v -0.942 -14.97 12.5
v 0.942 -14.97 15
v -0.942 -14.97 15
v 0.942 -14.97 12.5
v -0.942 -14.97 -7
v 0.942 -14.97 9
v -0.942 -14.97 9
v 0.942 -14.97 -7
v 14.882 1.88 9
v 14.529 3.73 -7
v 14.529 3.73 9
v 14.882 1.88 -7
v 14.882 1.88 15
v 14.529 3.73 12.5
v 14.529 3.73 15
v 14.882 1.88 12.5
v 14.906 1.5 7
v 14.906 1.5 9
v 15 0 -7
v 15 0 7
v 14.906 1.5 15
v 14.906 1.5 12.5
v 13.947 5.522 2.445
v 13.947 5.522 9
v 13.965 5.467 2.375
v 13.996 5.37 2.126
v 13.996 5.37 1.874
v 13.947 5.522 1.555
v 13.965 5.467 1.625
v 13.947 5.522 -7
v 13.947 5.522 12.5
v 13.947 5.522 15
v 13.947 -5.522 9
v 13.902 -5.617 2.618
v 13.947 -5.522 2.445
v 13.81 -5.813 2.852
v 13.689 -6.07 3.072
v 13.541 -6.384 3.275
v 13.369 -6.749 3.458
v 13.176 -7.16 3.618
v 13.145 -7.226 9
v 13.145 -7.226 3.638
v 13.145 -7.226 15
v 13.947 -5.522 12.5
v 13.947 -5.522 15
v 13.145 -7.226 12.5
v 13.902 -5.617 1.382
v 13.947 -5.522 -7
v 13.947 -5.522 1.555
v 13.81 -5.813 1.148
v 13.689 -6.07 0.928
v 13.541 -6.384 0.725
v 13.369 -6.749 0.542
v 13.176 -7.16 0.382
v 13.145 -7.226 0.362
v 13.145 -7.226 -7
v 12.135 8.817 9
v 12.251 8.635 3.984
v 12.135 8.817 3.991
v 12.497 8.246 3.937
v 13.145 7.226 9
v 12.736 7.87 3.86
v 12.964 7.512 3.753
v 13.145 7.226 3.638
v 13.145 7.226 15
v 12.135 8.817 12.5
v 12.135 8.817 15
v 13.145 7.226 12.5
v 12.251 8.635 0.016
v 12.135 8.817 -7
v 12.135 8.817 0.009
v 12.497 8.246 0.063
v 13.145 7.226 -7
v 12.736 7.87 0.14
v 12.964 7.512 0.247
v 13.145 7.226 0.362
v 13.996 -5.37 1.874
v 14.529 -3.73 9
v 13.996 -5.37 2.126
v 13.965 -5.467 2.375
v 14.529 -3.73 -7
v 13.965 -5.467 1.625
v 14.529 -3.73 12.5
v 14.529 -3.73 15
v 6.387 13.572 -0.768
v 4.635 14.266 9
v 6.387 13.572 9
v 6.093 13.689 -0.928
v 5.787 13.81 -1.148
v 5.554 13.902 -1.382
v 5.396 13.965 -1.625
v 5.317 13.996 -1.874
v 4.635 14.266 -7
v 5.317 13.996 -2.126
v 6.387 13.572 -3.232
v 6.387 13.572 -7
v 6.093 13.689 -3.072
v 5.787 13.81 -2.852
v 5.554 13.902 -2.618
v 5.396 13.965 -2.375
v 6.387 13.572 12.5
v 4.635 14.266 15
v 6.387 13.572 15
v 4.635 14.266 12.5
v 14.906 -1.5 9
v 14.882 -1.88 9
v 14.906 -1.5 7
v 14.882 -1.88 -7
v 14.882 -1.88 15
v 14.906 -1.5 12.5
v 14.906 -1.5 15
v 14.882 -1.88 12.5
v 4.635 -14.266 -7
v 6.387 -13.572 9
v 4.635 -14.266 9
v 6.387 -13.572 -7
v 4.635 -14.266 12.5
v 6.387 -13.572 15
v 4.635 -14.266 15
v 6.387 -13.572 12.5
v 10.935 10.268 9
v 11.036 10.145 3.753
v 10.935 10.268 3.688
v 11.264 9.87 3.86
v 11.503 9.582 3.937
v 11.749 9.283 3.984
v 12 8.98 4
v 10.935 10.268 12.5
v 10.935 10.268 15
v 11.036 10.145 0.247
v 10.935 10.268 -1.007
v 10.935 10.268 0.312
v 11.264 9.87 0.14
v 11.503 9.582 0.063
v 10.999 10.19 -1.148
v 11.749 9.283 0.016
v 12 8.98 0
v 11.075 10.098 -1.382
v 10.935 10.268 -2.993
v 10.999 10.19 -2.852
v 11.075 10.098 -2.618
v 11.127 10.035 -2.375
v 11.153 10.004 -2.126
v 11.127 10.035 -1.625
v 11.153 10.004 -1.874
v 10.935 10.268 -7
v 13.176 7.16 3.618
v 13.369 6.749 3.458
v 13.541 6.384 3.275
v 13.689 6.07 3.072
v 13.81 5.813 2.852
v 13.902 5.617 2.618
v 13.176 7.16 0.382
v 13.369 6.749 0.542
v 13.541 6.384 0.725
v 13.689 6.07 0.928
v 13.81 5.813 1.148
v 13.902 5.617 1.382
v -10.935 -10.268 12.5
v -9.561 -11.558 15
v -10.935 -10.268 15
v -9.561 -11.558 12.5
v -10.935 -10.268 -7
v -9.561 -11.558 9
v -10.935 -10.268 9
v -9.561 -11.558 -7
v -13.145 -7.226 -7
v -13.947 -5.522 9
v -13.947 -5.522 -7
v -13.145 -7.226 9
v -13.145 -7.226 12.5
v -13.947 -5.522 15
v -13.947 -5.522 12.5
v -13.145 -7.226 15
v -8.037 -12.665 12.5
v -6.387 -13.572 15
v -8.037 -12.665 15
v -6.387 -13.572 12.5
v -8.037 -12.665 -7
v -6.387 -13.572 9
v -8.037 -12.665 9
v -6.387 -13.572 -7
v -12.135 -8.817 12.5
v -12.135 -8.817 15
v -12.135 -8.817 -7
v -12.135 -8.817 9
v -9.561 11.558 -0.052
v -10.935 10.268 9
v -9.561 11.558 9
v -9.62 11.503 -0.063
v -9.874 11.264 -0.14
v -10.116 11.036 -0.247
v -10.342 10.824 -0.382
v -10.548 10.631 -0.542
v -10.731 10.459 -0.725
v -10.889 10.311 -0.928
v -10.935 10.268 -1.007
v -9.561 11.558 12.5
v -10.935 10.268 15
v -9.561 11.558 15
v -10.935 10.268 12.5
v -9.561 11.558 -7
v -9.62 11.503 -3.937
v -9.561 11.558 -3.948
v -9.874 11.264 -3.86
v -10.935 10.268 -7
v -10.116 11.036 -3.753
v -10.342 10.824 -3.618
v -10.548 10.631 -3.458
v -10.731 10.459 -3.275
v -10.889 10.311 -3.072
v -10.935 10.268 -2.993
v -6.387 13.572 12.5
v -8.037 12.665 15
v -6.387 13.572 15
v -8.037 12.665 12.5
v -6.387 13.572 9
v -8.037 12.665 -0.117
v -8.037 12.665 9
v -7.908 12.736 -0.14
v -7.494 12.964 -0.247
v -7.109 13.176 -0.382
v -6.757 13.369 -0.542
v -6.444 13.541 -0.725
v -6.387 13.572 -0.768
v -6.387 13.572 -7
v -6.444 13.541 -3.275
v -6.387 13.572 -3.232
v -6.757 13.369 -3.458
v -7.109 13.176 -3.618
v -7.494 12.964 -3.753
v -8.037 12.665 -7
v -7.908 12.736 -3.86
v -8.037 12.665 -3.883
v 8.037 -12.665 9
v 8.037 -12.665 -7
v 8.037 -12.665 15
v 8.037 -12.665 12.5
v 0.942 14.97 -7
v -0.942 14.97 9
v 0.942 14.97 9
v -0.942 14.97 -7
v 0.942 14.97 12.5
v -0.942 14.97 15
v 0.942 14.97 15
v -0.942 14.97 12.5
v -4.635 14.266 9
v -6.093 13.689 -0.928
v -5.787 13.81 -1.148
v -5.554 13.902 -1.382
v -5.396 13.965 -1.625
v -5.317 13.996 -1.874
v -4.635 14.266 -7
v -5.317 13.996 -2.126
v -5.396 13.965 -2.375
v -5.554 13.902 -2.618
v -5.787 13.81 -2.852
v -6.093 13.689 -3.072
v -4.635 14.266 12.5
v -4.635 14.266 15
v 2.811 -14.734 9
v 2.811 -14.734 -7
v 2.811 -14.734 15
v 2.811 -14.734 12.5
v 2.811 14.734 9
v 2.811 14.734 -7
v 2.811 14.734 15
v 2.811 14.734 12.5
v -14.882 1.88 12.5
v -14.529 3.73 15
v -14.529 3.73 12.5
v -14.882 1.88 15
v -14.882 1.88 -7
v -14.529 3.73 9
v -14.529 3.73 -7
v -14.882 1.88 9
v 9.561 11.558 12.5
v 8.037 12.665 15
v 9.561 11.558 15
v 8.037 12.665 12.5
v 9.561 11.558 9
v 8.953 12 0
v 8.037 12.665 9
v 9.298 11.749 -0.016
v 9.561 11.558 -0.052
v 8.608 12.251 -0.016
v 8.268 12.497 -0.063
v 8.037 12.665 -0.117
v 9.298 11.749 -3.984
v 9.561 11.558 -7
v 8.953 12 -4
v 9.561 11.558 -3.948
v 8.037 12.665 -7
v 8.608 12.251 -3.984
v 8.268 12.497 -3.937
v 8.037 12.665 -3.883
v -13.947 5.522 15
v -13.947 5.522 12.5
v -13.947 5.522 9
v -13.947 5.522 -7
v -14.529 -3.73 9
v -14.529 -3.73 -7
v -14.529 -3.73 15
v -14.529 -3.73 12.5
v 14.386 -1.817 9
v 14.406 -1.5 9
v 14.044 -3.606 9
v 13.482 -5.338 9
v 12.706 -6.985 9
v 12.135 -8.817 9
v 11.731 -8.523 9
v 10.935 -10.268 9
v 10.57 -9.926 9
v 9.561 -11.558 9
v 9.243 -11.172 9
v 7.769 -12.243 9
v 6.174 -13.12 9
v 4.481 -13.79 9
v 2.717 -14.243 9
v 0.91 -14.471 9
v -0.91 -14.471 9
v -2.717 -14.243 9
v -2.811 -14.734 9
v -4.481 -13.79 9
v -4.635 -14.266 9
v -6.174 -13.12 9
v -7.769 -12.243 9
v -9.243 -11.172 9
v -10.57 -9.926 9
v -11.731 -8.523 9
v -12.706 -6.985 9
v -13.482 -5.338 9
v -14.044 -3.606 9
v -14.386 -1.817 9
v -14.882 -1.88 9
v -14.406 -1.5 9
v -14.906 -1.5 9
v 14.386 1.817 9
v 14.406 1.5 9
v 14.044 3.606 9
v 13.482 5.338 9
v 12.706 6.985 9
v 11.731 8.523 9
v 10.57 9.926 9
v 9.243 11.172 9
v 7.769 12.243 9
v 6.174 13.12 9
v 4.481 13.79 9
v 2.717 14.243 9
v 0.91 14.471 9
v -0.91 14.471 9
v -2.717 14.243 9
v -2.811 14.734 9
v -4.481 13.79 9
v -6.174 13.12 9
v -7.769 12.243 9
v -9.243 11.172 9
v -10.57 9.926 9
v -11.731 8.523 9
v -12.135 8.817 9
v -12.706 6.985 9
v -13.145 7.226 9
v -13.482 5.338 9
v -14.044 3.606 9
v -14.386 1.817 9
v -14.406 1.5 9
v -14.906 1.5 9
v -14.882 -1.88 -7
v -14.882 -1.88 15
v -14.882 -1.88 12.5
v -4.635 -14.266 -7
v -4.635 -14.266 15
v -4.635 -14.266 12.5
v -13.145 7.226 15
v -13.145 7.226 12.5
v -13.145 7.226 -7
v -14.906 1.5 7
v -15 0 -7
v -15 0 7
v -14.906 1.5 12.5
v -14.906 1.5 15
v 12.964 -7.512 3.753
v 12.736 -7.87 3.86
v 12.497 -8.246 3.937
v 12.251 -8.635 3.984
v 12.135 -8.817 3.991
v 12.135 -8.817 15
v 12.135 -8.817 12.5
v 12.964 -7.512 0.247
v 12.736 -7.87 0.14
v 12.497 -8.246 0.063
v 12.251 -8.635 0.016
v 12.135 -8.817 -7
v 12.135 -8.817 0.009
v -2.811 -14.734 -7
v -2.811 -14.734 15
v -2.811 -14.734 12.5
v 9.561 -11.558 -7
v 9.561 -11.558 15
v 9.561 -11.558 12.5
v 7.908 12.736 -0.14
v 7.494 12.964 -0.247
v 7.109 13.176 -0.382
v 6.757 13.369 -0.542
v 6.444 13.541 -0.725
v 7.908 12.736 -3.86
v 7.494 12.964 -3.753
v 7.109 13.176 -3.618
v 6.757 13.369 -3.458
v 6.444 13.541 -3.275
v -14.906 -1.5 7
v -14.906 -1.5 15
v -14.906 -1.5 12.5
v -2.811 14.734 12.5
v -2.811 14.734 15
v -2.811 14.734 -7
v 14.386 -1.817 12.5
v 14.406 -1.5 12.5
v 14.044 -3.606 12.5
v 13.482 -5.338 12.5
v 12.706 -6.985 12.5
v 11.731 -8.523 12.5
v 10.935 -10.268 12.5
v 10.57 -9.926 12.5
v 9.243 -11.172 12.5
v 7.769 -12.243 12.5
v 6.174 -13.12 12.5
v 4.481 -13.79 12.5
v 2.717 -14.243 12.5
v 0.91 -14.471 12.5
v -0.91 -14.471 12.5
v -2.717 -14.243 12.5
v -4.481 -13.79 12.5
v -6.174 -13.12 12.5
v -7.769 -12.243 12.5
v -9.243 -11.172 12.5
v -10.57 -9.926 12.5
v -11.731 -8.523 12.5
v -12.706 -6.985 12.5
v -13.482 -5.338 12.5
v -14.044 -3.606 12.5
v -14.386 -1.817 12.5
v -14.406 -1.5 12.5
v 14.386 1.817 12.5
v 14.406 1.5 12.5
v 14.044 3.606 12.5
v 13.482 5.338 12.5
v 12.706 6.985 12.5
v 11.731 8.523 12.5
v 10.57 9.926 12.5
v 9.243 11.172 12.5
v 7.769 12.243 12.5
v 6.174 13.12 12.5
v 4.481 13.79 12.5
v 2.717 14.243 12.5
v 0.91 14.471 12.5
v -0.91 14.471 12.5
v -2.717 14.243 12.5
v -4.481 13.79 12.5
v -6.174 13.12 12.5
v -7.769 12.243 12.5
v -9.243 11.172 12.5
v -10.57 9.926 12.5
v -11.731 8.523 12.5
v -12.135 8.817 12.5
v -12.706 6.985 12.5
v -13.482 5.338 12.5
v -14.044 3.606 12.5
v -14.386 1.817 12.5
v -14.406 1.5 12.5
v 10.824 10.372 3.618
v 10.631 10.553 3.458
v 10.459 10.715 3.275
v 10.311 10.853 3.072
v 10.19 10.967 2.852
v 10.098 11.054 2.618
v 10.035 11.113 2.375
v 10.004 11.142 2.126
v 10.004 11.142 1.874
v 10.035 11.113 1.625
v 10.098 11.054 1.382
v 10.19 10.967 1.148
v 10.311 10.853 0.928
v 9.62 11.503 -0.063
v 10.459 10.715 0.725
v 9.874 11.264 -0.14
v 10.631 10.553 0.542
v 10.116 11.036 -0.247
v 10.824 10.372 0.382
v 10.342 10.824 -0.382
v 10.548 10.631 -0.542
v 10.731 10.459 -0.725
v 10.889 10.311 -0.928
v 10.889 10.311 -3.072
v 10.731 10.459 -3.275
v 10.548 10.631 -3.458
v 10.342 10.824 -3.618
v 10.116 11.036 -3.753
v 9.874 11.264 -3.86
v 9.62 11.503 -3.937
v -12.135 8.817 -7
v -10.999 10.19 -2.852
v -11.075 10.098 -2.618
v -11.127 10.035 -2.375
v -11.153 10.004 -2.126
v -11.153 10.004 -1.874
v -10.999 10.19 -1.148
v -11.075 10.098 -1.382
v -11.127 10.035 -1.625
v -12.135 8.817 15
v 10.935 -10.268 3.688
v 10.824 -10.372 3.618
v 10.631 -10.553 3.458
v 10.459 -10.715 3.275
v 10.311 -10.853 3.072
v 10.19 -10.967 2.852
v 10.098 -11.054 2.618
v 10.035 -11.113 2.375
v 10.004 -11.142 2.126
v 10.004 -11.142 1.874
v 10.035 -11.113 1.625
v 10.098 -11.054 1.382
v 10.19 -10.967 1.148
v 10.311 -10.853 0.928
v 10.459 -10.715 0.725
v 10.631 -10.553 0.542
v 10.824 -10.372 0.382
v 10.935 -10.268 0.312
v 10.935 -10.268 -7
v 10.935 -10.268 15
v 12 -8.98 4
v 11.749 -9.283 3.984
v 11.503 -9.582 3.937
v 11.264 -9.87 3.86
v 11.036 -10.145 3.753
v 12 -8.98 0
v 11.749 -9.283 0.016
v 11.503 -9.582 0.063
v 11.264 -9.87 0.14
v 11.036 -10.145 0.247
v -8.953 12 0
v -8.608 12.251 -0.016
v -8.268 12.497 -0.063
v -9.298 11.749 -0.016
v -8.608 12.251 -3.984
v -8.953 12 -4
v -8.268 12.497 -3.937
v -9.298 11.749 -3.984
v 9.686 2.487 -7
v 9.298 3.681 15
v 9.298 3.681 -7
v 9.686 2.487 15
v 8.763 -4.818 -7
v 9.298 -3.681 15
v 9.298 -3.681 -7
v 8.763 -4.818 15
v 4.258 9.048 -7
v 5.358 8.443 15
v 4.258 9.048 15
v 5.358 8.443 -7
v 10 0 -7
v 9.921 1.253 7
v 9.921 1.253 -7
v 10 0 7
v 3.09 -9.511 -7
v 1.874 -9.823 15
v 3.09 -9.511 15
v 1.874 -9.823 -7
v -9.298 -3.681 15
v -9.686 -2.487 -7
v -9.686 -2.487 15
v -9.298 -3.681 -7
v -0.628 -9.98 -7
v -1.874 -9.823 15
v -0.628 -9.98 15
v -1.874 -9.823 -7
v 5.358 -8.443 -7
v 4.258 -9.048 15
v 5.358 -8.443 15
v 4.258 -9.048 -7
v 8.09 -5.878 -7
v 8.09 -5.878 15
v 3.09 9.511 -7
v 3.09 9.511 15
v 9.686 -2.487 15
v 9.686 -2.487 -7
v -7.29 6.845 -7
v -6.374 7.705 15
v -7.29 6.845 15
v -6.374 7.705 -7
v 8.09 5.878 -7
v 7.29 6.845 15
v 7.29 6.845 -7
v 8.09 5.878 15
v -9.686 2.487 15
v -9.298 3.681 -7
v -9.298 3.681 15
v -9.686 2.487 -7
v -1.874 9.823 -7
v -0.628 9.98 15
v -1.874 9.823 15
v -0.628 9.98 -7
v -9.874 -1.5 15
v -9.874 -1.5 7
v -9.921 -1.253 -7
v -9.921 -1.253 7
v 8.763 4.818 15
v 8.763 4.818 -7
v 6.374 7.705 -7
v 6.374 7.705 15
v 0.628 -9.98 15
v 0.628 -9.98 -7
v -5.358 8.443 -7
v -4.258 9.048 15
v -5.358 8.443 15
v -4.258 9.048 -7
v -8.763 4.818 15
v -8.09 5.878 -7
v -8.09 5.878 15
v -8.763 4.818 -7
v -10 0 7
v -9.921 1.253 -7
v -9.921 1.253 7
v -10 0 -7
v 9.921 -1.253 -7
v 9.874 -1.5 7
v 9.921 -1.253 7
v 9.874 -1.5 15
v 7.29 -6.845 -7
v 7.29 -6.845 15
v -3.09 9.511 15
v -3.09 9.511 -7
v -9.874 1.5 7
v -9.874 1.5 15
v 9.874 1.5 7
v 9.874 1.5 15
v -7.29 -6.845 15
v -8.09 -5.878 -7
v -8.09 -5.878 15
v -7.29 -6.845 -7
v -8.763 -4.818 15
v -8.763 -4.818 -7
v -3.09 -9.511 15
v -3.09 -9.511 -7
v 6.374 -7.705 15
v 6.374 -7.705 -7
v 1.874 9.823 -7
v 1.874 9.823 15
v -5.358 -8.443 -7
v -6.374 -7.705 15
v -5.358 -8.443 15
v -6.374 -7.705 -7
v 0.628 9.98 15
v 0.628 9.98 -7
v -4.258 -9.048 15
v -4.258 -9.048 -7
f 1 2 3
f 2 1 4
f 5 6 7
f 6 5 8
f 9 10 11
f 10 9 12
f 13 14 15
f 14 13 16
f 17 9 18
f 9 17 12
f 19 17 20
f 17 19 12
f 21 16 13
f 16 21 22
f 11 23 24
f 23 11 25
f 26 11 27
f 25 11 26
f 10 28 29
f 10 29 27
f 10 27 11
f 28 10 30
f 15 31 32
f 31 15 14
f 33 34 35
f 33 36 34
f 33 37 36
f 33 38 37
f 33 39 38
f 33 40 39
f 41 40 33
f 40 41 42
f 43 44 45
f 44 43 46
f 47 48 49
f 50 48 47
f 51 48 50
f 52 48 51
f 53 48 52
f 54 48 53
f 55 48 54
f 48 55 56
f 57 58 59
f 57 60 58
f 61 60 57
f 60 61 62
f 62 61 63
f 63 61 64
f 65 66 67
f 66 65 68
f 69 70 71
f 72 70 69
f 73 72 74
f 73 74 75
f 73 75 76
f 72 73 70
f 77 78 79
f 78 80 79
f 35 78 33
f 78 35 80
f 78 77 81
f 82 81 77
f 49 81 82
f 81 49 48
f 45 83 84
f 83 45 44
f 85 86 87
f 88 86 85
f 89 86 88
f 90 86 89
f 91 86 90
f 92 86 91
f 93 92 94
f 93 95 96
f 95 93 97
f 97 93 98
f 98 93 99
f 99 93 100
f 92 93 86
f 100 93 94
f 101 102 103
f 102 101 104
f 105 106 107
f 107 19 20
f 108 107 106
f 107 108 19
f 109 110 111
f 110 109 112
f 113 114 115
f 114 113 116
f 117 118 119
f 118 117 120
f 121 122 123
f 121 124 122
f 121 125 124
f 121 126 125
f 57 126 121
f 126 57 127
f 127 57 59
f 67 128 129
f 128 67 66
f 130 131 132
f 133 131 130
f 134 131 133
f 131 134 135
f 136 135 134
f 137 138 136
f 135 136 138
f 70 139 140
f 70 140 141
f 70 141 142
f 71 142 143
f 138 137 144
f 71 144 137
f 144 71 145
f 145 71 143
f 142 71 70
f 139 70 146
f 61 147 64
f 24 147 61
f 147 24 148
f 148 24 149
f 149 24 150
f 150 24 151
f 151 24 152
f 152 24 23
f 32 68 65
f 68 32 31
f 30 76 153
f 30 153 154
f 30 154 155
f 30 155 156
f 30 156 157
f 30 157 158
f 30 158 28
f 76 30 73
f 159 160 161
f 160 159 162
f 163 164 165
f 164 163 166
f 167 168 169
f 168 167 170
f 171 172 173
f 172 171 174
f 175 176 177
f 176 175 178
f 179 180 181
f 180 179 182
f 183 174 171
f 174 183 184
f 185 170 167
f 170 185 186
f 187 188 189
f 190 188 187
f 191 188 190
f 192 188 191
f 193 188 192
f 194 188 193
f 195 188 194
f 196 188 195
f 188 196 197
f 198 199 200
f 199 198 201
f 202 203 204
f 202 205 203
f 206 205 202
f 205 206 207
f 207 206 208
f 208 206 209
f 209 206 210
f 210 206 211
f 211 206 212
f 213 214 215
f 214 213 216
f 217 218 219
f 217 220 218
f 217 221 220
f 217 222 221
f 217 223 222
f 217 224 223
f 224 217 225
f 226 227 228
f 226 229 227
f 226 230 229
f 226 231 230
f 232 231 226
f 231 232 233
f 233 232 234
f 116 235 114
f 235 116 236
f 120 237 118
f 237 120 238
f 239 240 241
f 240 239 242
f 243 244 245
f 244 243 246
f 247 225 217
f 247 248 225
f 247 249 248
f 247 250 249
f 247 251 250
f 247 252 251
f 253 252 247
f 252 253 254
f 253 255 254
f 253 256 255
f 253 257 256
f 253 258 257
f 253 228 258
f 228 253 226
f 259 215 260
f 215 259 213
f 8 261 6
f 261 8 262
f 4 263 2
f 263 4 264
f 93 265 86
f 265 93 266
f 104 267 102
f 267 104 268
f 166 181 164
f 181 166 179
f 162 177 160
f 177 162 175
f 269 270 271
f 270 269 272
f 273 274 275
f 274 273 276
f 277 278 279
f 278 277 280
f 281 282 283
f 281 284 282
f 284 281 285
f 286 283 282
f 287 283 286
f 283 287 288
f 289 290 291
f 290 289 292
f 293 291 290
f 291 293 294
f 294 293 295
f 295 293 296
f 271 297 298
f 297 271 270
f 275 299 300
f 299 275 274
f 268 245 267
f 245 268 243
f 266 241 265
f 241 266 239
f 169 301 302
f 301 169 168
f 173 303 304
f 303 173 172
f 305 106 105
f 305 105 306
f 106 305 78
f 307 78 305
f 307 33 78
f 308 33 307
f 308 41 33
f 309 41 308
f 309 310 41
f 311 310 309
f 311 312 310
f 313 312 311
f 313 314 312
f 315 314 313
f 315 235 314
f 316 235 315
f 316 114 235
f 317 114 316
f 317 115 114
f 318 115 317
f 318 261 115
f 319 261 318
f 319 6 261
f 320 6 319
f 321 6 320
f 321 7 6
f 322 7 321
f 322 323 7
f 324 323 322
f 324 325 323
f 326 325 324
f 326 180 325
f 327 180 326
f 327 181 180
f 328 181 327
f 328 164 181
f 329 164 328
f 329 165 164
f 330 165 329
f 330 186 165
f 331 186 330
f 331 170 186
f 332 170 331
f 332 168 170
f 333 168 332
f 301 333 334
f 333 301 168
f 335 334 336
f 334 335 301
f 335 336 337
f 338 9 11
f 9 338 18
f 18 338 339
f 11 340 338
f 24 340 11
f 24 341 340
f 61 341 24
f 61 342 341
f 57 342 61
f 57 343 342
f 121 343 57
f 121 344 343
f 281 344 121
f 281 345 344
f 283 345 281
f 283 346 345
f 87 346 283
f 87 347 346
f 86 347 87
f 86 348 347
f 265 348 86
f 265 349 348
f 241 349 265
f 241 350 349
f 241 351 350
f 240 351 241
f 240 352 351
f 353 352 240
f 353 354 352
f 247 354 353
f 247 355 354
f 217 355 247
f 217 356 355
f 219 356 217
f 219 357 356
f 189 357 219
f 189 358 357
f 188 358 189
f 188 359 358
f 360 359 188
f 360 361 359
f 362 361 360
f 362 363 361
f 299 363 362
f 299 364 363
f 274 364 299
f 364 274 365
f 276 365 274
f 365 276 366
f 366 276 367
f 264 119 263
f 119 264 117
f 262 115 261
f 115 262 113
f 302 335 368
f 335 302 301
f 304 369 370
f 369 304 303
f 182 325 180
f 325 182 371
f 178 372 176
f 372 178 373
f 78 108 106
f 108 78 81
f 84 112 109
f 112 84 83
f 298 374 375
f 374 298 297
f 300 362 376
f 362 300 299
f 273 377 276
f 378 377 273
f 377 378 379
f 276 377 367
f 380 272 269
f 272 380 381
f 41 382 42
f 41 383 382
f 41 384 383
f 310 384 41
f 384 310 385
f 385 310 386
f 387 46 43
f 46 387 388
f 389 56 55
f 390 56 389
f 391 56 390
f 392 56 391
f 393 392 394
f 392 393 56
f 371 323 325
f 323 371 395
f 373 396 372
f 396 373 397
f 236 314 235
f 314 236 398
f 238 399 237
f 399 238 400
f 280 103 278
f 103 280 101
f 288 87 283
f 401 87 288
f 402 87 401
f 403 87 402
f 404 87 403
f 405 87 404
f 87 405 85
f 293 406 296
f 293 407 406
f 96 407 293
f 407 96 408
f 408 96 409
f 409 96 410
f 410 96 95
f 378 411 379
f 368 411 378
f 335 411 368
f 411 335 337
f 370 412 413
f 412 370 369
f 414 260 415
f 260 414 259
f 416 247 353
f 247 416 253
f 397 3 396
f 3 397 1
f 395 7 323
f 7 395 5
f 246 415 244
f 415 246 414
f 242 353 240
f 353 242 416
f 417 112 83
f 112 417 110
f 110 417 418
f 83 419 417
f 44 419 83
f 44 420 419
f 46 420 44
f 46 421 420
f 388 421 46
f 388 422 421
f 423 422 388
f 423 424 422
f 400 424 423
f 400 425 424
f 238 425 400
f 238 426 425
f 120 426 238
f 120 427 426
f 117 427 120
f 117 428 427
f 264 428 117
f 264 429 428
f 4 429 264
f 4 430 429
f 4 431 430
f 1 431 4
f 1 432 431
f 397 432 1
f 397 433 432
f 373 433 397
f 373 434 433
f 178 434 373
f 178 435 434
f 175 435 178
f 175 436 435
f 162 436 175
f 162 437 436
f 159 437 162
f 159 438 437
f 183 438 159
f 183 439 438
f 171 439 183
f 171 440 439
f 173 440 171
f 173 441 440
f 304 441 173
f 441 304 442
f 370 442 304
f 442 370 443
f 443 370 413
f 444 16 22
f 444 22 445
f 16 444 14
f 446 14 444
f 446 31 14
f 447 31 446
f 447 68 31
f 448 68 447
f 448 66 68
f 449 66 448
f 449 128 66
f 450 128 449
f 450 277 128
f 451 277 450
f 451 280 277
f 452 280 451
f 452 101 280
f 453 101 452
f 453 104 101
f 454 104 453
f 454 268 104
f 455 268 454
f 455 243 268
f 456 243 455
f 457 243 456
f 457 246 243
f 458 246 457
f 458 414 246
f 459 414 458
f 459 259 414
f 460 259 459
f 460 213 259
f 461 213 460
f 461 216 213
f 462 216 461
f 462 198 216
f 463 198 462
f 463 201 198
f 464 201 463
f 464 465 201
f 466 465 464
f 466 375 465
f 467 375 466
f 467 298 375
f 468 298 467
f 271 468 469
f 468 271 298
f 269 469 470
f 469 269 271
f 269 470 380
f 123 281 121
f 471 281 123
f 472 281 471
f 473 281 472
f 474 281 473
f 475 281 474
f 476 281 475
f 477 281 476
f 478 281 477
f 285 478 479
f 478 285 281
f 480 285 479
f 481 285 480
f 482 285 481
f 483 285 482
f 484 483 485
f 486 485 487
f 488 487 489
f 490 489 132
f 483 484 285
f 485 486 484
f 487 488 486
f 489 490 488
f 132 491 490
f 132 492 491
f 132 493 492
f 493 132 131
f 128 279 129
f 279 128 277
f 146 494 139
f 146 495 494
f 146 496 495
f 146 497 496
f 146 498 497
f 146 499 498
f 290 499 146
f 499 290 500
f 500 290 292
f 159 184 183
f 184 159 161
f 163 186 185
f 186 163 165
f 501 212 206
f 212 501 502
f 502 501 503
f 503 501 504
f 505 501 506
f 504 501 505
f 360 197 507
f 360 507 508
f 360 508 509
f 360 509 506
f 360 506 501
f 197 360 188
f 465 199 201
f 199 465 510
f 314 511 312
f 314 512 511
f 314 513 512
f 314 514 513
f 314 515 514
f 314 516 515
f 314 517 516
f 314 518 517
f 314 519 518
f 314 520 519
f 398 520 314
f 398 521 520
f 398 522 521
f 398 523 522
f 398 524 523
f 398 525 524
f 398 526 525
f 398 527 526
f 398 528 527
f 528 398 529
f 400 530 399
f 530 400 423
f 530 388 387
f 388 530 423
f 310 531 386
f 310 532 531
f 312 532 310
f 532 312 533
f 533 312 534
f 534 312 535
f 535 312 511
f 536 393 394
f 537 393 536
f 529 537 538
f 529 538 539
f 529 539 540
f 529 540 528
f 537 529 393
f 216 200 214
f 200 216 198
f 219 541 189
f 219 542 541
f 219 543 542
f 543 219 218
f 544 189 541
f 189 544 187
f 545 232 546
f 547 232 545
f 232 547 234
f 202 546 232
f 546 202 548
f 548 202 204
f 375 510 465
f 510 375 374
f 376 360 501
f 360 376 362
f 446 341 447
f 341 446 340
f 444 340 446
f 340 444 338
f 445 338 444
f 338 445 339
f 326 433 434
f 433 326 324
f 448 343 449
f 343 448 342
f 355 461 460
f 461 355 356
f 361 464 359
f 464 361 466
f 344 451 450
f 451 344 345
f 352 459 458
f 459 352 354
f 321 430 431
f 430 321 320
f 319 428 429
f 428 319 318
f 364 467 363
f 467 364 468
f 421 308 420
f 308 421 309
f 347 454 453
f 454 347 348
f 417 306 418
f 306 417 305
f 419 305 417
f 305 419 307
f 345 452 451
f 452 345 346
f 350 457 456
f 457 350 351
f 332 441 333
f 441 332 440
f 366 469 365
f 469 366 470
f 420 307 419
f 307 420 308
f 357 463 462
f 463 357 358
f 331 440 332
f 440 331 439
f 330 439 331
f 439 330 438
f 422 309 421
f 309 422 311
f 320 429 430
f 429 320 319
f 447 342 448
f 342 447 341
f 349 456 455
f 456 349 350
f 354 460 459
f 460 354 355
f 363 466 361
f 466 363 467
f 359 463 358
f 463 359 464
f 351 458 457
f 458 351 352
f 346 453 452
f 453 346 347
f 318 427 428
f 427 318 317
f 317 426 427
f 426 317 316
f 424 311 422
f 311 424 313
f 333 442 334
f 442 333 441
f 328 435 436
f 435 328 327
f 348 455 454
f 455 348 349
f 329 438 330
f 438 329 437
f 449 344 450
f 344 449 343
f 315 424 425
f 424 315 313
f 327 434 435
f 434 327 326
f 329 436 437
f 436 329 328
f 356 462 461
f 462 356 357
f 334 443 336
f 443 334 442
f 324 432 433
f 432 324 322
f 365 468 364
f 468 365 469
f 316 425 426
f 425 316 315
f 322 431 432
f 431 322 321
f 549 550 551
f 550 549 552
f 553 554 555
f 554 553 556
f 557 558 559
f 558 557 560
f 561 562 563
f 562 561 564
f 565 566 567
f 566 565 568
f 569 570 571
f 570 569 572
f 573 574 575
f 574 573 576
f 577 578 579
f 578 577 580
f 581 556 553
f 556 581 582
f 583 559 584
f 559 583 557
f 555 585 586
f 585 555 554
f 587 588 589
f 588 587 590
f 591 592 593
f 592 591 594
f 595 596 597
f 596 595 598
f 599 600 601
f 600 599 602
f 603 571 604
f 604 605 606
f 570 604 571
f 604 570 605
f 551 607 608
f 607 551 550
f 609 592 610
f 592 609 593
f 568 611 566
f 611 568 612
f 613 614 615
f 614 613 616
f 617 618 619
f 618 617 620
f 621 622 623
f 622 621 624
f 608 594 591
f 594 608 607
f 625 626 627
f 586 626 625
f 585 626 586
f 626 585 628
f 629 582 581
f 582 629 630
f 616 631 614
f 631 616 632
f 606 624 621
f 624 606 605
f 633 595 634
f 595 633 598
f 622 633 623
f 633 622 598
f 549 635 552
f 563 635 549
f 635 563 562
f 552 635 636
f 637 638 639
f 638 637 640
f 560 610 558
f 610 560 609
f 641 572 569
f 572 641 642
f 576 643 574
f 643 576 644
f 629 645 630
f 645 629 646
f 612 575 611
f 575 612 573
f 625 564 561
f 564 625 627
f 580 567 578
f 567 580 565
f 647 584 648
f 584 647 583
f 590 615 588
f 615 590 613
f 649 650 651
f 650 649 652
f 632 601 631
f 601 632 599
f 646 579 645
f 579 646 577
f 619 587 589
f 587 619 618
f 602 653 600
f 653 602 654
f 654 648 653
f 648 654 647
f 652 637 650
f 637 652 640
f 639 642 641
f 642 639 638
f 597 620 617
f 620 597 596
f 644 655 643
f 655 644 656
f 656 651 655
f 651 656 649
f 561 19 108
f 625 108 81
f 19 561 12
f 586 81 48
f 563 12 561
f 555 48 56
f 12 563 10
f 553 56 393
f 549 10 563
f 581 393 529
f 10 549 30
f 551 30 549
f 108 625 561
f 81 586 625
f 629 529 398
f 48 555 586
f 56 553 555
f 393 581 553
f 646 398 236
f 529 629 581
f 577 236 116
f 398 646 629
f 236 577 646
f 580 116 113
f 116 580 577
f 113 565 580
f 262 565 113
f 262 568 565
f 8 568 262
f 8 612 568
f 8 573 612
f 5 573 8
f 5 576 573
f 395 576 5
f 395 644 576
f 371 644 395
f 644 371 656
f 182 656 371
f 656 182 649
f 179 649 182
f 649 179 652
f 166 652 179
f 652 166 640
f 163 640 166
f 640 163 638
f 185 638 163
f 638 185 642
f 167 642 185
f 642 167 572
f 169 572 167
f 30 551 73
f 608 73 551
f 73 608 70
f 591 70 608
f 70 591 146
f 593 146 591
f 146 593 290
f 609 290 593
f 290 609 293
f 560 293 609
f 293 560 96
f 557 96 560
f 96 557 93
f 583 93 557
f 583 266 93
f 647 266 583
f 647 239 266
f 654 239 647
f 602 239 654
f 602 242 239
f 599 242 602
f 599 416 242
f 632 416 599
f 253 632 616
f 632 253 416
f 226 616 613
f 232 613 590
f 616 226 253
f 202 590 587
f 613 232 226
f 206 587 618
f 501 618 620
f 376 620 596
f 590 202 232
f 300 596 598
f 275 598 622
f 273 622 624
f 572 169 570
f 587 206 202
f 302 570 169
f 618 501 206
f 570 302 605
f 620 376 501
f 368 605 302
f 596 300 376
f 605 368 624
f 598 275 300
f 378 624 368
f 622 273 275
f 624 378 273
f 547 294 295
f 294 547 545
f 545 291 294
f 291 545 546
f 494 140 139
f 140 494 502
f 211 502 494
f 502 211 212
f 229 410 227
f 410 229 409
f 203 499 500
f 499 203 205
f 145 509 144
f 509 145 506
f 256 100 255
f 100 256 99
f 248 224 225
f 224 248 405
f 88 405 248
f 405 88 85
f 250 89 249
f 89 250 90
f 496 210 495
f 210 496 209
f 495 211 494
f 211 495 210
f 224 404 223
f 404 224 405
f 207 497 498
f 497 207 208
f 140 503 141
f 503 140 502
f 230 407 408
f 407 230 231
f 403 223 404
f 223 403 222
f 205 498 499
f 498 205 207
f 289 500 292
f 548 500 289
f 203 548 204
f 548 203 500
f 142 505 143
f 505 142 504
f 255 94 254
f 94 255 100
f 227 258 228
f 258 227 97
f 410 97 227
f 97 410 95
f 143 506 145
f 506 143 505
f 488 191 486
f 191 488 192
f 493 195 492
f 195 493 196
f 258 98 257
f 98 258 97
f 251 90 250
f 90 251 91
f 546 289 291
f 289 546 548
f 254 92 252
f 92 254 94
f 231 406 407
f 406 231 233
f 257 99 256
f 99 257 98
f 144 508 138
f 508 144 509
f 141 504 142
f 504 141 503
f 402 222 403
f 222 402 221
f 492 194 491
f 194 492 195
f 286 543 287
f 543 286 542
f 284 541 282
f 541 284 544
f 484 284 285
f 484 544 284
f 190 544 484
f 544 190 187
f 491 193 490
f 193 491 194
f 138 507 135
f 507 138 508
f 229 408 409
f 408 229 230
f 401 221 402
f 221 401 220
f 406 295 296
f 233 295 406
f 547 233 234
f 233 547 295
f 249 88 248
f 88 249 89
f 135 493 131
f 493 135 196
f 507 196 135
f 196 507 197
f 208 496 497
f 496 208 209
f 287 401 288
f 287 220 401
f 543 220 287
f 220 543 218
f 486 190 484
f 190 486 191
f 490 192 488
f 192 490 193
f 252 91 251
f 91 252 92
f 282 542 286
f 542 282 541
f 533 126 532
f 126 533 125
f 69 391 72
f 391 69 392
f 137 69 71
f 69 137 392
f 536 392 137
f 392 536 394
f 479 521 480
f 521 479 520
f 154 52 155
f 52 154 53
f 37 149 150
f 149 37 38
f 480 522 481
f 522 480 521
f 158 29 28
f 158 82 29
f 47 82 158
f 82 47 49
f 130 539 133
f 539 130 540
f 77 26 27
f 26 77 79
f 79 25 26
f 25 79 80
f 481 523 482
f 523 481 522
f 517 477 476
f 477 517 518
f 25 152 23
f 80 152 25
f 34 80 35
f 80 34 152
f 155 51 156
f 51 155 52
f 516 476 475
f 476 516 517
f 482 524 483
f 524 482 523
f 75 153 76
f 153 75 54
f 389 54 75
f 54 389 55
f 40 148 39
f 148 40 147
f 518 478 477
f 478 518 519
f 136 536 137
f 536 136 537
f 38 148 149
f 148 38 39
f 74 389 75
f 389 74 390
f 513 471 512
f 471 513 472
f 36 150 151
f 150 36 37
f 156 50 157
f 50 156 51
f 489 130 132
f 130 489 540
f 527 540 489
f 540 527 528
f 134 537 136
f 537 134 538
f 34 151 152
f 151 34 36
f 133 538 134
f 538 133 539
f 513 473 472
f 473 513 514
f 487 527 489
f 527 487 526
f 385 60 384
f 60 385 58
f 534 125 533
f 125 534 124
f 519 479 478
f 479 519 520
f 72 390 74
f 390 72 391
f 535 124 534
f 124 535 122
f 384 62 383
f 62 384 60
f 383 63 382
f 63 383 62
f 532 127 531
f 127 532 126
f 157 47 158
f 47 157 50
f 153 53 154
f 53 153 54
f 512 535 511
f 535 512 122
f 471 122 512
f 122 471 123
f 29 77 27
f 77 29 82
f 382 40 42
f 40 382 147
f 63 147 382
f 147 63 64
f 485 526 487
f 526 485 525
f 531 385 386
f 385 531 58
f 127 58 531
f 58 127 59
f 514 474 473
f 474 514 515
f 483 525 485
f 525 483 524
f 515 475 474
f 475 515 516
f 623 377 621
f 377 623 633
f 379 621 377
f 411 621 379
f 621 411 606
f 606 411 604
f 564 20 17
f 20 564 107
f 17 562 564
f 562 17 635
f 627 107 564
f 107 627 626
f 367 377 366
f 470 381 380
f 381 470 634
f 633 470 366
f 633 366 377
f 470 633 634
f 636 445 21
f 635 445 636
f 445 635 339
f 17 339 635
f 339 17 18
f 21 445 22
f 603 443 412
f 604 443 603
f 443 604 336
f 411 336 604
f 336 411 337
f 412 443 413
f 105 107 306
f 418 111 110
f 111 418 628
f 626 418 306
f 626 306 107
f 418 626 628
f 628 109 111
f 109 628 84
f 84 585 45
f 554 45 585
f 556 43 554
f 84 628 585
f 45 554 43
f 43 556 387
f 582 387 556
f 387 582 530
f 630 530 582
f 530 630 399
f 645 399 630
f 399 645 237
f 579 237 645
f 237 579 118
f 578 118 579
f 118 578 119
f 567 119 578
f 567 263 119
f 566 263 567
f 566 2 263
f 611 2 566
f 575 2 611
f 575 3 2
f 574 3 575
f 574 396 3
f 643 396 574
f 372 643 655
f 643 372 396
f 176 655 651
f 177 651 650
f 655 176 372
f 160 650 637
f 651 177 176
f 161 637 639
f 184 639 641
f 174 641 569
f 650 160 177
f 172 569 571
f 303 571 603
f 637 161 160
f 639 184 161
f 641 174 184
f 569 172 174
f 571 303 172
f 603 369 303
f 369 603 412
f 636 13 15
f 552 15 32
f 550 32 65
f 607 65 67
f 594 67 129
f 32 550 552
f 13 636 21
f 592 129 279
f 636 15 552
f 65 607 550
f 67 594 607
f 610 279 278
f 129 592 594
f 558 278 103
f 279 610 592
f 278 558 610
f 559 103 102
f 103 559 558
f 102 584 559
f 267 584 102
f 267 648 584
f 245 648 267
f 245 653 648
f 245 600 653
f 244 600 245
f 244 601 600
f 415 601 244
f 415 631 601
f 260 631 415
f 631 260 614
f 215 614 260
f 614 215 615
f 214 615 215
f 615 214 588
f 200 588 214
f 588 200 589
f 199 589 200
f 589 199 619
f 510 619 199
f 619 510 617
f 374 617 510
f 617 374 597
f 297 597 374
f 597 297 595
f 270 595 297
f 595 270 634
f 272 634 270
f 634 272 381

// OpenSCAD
//Yagi element to mast mounting bracket
//Satnogs Project MPL2.0 http://satnogs.org

$fn=50; //High Resolution

el_d = 4; 					   //Element diameter
mast_d = 20; 					//Mast diameter
cube_e = mast_d+el_d*2+2;  //Cube edge
mount_l = 14; 					//Mount length


module element()
{
	cylinder(h=mast_d*2,d=el_d);
}

module tire_up()
{
	difference() {
		cylinder(h=3.5,d=cube_e);
		cylinder(h=3.5,d=cube_e-1);
	}
}

module satnogs_yagi_mount()
{
	rotate([0,90,0])
		intersection() {
			difference() {
				translate([-cube_e/2,-cube_e/2,-cube_e/2])
					cube([cube_e,cube_e,cube_e]);
			   union() {
					rotate([0,270,0])
						translate([0,0,-mount_l/2])
							cylinder(h=mount_l*2,d=mast_d);
				   translate([el_d/2,mast_d/2+el_d/2,-mast_d])
						element();
					rotate([90,0,0])
						translate([-el_d/2,mast_d/2+el_d/2,-mast_d])
							element();
					translate([-mount_l*1.5,-1.5,-(mast_d+el_d*2+2)/2])
						cube([mount_l,3,mast_d+el_d*2+2]);
					rotate([0,270,0])
						translate([0,0,mount_l-5])
							tire_up();
				}
			}
		   rotate([0,270,0])
				translate([0,0,-mount_l/2])
					cylinder(h=mount_l*2,d=mast_d+el_d*2+2);
		}
}

satnogs_yagi_mount();
